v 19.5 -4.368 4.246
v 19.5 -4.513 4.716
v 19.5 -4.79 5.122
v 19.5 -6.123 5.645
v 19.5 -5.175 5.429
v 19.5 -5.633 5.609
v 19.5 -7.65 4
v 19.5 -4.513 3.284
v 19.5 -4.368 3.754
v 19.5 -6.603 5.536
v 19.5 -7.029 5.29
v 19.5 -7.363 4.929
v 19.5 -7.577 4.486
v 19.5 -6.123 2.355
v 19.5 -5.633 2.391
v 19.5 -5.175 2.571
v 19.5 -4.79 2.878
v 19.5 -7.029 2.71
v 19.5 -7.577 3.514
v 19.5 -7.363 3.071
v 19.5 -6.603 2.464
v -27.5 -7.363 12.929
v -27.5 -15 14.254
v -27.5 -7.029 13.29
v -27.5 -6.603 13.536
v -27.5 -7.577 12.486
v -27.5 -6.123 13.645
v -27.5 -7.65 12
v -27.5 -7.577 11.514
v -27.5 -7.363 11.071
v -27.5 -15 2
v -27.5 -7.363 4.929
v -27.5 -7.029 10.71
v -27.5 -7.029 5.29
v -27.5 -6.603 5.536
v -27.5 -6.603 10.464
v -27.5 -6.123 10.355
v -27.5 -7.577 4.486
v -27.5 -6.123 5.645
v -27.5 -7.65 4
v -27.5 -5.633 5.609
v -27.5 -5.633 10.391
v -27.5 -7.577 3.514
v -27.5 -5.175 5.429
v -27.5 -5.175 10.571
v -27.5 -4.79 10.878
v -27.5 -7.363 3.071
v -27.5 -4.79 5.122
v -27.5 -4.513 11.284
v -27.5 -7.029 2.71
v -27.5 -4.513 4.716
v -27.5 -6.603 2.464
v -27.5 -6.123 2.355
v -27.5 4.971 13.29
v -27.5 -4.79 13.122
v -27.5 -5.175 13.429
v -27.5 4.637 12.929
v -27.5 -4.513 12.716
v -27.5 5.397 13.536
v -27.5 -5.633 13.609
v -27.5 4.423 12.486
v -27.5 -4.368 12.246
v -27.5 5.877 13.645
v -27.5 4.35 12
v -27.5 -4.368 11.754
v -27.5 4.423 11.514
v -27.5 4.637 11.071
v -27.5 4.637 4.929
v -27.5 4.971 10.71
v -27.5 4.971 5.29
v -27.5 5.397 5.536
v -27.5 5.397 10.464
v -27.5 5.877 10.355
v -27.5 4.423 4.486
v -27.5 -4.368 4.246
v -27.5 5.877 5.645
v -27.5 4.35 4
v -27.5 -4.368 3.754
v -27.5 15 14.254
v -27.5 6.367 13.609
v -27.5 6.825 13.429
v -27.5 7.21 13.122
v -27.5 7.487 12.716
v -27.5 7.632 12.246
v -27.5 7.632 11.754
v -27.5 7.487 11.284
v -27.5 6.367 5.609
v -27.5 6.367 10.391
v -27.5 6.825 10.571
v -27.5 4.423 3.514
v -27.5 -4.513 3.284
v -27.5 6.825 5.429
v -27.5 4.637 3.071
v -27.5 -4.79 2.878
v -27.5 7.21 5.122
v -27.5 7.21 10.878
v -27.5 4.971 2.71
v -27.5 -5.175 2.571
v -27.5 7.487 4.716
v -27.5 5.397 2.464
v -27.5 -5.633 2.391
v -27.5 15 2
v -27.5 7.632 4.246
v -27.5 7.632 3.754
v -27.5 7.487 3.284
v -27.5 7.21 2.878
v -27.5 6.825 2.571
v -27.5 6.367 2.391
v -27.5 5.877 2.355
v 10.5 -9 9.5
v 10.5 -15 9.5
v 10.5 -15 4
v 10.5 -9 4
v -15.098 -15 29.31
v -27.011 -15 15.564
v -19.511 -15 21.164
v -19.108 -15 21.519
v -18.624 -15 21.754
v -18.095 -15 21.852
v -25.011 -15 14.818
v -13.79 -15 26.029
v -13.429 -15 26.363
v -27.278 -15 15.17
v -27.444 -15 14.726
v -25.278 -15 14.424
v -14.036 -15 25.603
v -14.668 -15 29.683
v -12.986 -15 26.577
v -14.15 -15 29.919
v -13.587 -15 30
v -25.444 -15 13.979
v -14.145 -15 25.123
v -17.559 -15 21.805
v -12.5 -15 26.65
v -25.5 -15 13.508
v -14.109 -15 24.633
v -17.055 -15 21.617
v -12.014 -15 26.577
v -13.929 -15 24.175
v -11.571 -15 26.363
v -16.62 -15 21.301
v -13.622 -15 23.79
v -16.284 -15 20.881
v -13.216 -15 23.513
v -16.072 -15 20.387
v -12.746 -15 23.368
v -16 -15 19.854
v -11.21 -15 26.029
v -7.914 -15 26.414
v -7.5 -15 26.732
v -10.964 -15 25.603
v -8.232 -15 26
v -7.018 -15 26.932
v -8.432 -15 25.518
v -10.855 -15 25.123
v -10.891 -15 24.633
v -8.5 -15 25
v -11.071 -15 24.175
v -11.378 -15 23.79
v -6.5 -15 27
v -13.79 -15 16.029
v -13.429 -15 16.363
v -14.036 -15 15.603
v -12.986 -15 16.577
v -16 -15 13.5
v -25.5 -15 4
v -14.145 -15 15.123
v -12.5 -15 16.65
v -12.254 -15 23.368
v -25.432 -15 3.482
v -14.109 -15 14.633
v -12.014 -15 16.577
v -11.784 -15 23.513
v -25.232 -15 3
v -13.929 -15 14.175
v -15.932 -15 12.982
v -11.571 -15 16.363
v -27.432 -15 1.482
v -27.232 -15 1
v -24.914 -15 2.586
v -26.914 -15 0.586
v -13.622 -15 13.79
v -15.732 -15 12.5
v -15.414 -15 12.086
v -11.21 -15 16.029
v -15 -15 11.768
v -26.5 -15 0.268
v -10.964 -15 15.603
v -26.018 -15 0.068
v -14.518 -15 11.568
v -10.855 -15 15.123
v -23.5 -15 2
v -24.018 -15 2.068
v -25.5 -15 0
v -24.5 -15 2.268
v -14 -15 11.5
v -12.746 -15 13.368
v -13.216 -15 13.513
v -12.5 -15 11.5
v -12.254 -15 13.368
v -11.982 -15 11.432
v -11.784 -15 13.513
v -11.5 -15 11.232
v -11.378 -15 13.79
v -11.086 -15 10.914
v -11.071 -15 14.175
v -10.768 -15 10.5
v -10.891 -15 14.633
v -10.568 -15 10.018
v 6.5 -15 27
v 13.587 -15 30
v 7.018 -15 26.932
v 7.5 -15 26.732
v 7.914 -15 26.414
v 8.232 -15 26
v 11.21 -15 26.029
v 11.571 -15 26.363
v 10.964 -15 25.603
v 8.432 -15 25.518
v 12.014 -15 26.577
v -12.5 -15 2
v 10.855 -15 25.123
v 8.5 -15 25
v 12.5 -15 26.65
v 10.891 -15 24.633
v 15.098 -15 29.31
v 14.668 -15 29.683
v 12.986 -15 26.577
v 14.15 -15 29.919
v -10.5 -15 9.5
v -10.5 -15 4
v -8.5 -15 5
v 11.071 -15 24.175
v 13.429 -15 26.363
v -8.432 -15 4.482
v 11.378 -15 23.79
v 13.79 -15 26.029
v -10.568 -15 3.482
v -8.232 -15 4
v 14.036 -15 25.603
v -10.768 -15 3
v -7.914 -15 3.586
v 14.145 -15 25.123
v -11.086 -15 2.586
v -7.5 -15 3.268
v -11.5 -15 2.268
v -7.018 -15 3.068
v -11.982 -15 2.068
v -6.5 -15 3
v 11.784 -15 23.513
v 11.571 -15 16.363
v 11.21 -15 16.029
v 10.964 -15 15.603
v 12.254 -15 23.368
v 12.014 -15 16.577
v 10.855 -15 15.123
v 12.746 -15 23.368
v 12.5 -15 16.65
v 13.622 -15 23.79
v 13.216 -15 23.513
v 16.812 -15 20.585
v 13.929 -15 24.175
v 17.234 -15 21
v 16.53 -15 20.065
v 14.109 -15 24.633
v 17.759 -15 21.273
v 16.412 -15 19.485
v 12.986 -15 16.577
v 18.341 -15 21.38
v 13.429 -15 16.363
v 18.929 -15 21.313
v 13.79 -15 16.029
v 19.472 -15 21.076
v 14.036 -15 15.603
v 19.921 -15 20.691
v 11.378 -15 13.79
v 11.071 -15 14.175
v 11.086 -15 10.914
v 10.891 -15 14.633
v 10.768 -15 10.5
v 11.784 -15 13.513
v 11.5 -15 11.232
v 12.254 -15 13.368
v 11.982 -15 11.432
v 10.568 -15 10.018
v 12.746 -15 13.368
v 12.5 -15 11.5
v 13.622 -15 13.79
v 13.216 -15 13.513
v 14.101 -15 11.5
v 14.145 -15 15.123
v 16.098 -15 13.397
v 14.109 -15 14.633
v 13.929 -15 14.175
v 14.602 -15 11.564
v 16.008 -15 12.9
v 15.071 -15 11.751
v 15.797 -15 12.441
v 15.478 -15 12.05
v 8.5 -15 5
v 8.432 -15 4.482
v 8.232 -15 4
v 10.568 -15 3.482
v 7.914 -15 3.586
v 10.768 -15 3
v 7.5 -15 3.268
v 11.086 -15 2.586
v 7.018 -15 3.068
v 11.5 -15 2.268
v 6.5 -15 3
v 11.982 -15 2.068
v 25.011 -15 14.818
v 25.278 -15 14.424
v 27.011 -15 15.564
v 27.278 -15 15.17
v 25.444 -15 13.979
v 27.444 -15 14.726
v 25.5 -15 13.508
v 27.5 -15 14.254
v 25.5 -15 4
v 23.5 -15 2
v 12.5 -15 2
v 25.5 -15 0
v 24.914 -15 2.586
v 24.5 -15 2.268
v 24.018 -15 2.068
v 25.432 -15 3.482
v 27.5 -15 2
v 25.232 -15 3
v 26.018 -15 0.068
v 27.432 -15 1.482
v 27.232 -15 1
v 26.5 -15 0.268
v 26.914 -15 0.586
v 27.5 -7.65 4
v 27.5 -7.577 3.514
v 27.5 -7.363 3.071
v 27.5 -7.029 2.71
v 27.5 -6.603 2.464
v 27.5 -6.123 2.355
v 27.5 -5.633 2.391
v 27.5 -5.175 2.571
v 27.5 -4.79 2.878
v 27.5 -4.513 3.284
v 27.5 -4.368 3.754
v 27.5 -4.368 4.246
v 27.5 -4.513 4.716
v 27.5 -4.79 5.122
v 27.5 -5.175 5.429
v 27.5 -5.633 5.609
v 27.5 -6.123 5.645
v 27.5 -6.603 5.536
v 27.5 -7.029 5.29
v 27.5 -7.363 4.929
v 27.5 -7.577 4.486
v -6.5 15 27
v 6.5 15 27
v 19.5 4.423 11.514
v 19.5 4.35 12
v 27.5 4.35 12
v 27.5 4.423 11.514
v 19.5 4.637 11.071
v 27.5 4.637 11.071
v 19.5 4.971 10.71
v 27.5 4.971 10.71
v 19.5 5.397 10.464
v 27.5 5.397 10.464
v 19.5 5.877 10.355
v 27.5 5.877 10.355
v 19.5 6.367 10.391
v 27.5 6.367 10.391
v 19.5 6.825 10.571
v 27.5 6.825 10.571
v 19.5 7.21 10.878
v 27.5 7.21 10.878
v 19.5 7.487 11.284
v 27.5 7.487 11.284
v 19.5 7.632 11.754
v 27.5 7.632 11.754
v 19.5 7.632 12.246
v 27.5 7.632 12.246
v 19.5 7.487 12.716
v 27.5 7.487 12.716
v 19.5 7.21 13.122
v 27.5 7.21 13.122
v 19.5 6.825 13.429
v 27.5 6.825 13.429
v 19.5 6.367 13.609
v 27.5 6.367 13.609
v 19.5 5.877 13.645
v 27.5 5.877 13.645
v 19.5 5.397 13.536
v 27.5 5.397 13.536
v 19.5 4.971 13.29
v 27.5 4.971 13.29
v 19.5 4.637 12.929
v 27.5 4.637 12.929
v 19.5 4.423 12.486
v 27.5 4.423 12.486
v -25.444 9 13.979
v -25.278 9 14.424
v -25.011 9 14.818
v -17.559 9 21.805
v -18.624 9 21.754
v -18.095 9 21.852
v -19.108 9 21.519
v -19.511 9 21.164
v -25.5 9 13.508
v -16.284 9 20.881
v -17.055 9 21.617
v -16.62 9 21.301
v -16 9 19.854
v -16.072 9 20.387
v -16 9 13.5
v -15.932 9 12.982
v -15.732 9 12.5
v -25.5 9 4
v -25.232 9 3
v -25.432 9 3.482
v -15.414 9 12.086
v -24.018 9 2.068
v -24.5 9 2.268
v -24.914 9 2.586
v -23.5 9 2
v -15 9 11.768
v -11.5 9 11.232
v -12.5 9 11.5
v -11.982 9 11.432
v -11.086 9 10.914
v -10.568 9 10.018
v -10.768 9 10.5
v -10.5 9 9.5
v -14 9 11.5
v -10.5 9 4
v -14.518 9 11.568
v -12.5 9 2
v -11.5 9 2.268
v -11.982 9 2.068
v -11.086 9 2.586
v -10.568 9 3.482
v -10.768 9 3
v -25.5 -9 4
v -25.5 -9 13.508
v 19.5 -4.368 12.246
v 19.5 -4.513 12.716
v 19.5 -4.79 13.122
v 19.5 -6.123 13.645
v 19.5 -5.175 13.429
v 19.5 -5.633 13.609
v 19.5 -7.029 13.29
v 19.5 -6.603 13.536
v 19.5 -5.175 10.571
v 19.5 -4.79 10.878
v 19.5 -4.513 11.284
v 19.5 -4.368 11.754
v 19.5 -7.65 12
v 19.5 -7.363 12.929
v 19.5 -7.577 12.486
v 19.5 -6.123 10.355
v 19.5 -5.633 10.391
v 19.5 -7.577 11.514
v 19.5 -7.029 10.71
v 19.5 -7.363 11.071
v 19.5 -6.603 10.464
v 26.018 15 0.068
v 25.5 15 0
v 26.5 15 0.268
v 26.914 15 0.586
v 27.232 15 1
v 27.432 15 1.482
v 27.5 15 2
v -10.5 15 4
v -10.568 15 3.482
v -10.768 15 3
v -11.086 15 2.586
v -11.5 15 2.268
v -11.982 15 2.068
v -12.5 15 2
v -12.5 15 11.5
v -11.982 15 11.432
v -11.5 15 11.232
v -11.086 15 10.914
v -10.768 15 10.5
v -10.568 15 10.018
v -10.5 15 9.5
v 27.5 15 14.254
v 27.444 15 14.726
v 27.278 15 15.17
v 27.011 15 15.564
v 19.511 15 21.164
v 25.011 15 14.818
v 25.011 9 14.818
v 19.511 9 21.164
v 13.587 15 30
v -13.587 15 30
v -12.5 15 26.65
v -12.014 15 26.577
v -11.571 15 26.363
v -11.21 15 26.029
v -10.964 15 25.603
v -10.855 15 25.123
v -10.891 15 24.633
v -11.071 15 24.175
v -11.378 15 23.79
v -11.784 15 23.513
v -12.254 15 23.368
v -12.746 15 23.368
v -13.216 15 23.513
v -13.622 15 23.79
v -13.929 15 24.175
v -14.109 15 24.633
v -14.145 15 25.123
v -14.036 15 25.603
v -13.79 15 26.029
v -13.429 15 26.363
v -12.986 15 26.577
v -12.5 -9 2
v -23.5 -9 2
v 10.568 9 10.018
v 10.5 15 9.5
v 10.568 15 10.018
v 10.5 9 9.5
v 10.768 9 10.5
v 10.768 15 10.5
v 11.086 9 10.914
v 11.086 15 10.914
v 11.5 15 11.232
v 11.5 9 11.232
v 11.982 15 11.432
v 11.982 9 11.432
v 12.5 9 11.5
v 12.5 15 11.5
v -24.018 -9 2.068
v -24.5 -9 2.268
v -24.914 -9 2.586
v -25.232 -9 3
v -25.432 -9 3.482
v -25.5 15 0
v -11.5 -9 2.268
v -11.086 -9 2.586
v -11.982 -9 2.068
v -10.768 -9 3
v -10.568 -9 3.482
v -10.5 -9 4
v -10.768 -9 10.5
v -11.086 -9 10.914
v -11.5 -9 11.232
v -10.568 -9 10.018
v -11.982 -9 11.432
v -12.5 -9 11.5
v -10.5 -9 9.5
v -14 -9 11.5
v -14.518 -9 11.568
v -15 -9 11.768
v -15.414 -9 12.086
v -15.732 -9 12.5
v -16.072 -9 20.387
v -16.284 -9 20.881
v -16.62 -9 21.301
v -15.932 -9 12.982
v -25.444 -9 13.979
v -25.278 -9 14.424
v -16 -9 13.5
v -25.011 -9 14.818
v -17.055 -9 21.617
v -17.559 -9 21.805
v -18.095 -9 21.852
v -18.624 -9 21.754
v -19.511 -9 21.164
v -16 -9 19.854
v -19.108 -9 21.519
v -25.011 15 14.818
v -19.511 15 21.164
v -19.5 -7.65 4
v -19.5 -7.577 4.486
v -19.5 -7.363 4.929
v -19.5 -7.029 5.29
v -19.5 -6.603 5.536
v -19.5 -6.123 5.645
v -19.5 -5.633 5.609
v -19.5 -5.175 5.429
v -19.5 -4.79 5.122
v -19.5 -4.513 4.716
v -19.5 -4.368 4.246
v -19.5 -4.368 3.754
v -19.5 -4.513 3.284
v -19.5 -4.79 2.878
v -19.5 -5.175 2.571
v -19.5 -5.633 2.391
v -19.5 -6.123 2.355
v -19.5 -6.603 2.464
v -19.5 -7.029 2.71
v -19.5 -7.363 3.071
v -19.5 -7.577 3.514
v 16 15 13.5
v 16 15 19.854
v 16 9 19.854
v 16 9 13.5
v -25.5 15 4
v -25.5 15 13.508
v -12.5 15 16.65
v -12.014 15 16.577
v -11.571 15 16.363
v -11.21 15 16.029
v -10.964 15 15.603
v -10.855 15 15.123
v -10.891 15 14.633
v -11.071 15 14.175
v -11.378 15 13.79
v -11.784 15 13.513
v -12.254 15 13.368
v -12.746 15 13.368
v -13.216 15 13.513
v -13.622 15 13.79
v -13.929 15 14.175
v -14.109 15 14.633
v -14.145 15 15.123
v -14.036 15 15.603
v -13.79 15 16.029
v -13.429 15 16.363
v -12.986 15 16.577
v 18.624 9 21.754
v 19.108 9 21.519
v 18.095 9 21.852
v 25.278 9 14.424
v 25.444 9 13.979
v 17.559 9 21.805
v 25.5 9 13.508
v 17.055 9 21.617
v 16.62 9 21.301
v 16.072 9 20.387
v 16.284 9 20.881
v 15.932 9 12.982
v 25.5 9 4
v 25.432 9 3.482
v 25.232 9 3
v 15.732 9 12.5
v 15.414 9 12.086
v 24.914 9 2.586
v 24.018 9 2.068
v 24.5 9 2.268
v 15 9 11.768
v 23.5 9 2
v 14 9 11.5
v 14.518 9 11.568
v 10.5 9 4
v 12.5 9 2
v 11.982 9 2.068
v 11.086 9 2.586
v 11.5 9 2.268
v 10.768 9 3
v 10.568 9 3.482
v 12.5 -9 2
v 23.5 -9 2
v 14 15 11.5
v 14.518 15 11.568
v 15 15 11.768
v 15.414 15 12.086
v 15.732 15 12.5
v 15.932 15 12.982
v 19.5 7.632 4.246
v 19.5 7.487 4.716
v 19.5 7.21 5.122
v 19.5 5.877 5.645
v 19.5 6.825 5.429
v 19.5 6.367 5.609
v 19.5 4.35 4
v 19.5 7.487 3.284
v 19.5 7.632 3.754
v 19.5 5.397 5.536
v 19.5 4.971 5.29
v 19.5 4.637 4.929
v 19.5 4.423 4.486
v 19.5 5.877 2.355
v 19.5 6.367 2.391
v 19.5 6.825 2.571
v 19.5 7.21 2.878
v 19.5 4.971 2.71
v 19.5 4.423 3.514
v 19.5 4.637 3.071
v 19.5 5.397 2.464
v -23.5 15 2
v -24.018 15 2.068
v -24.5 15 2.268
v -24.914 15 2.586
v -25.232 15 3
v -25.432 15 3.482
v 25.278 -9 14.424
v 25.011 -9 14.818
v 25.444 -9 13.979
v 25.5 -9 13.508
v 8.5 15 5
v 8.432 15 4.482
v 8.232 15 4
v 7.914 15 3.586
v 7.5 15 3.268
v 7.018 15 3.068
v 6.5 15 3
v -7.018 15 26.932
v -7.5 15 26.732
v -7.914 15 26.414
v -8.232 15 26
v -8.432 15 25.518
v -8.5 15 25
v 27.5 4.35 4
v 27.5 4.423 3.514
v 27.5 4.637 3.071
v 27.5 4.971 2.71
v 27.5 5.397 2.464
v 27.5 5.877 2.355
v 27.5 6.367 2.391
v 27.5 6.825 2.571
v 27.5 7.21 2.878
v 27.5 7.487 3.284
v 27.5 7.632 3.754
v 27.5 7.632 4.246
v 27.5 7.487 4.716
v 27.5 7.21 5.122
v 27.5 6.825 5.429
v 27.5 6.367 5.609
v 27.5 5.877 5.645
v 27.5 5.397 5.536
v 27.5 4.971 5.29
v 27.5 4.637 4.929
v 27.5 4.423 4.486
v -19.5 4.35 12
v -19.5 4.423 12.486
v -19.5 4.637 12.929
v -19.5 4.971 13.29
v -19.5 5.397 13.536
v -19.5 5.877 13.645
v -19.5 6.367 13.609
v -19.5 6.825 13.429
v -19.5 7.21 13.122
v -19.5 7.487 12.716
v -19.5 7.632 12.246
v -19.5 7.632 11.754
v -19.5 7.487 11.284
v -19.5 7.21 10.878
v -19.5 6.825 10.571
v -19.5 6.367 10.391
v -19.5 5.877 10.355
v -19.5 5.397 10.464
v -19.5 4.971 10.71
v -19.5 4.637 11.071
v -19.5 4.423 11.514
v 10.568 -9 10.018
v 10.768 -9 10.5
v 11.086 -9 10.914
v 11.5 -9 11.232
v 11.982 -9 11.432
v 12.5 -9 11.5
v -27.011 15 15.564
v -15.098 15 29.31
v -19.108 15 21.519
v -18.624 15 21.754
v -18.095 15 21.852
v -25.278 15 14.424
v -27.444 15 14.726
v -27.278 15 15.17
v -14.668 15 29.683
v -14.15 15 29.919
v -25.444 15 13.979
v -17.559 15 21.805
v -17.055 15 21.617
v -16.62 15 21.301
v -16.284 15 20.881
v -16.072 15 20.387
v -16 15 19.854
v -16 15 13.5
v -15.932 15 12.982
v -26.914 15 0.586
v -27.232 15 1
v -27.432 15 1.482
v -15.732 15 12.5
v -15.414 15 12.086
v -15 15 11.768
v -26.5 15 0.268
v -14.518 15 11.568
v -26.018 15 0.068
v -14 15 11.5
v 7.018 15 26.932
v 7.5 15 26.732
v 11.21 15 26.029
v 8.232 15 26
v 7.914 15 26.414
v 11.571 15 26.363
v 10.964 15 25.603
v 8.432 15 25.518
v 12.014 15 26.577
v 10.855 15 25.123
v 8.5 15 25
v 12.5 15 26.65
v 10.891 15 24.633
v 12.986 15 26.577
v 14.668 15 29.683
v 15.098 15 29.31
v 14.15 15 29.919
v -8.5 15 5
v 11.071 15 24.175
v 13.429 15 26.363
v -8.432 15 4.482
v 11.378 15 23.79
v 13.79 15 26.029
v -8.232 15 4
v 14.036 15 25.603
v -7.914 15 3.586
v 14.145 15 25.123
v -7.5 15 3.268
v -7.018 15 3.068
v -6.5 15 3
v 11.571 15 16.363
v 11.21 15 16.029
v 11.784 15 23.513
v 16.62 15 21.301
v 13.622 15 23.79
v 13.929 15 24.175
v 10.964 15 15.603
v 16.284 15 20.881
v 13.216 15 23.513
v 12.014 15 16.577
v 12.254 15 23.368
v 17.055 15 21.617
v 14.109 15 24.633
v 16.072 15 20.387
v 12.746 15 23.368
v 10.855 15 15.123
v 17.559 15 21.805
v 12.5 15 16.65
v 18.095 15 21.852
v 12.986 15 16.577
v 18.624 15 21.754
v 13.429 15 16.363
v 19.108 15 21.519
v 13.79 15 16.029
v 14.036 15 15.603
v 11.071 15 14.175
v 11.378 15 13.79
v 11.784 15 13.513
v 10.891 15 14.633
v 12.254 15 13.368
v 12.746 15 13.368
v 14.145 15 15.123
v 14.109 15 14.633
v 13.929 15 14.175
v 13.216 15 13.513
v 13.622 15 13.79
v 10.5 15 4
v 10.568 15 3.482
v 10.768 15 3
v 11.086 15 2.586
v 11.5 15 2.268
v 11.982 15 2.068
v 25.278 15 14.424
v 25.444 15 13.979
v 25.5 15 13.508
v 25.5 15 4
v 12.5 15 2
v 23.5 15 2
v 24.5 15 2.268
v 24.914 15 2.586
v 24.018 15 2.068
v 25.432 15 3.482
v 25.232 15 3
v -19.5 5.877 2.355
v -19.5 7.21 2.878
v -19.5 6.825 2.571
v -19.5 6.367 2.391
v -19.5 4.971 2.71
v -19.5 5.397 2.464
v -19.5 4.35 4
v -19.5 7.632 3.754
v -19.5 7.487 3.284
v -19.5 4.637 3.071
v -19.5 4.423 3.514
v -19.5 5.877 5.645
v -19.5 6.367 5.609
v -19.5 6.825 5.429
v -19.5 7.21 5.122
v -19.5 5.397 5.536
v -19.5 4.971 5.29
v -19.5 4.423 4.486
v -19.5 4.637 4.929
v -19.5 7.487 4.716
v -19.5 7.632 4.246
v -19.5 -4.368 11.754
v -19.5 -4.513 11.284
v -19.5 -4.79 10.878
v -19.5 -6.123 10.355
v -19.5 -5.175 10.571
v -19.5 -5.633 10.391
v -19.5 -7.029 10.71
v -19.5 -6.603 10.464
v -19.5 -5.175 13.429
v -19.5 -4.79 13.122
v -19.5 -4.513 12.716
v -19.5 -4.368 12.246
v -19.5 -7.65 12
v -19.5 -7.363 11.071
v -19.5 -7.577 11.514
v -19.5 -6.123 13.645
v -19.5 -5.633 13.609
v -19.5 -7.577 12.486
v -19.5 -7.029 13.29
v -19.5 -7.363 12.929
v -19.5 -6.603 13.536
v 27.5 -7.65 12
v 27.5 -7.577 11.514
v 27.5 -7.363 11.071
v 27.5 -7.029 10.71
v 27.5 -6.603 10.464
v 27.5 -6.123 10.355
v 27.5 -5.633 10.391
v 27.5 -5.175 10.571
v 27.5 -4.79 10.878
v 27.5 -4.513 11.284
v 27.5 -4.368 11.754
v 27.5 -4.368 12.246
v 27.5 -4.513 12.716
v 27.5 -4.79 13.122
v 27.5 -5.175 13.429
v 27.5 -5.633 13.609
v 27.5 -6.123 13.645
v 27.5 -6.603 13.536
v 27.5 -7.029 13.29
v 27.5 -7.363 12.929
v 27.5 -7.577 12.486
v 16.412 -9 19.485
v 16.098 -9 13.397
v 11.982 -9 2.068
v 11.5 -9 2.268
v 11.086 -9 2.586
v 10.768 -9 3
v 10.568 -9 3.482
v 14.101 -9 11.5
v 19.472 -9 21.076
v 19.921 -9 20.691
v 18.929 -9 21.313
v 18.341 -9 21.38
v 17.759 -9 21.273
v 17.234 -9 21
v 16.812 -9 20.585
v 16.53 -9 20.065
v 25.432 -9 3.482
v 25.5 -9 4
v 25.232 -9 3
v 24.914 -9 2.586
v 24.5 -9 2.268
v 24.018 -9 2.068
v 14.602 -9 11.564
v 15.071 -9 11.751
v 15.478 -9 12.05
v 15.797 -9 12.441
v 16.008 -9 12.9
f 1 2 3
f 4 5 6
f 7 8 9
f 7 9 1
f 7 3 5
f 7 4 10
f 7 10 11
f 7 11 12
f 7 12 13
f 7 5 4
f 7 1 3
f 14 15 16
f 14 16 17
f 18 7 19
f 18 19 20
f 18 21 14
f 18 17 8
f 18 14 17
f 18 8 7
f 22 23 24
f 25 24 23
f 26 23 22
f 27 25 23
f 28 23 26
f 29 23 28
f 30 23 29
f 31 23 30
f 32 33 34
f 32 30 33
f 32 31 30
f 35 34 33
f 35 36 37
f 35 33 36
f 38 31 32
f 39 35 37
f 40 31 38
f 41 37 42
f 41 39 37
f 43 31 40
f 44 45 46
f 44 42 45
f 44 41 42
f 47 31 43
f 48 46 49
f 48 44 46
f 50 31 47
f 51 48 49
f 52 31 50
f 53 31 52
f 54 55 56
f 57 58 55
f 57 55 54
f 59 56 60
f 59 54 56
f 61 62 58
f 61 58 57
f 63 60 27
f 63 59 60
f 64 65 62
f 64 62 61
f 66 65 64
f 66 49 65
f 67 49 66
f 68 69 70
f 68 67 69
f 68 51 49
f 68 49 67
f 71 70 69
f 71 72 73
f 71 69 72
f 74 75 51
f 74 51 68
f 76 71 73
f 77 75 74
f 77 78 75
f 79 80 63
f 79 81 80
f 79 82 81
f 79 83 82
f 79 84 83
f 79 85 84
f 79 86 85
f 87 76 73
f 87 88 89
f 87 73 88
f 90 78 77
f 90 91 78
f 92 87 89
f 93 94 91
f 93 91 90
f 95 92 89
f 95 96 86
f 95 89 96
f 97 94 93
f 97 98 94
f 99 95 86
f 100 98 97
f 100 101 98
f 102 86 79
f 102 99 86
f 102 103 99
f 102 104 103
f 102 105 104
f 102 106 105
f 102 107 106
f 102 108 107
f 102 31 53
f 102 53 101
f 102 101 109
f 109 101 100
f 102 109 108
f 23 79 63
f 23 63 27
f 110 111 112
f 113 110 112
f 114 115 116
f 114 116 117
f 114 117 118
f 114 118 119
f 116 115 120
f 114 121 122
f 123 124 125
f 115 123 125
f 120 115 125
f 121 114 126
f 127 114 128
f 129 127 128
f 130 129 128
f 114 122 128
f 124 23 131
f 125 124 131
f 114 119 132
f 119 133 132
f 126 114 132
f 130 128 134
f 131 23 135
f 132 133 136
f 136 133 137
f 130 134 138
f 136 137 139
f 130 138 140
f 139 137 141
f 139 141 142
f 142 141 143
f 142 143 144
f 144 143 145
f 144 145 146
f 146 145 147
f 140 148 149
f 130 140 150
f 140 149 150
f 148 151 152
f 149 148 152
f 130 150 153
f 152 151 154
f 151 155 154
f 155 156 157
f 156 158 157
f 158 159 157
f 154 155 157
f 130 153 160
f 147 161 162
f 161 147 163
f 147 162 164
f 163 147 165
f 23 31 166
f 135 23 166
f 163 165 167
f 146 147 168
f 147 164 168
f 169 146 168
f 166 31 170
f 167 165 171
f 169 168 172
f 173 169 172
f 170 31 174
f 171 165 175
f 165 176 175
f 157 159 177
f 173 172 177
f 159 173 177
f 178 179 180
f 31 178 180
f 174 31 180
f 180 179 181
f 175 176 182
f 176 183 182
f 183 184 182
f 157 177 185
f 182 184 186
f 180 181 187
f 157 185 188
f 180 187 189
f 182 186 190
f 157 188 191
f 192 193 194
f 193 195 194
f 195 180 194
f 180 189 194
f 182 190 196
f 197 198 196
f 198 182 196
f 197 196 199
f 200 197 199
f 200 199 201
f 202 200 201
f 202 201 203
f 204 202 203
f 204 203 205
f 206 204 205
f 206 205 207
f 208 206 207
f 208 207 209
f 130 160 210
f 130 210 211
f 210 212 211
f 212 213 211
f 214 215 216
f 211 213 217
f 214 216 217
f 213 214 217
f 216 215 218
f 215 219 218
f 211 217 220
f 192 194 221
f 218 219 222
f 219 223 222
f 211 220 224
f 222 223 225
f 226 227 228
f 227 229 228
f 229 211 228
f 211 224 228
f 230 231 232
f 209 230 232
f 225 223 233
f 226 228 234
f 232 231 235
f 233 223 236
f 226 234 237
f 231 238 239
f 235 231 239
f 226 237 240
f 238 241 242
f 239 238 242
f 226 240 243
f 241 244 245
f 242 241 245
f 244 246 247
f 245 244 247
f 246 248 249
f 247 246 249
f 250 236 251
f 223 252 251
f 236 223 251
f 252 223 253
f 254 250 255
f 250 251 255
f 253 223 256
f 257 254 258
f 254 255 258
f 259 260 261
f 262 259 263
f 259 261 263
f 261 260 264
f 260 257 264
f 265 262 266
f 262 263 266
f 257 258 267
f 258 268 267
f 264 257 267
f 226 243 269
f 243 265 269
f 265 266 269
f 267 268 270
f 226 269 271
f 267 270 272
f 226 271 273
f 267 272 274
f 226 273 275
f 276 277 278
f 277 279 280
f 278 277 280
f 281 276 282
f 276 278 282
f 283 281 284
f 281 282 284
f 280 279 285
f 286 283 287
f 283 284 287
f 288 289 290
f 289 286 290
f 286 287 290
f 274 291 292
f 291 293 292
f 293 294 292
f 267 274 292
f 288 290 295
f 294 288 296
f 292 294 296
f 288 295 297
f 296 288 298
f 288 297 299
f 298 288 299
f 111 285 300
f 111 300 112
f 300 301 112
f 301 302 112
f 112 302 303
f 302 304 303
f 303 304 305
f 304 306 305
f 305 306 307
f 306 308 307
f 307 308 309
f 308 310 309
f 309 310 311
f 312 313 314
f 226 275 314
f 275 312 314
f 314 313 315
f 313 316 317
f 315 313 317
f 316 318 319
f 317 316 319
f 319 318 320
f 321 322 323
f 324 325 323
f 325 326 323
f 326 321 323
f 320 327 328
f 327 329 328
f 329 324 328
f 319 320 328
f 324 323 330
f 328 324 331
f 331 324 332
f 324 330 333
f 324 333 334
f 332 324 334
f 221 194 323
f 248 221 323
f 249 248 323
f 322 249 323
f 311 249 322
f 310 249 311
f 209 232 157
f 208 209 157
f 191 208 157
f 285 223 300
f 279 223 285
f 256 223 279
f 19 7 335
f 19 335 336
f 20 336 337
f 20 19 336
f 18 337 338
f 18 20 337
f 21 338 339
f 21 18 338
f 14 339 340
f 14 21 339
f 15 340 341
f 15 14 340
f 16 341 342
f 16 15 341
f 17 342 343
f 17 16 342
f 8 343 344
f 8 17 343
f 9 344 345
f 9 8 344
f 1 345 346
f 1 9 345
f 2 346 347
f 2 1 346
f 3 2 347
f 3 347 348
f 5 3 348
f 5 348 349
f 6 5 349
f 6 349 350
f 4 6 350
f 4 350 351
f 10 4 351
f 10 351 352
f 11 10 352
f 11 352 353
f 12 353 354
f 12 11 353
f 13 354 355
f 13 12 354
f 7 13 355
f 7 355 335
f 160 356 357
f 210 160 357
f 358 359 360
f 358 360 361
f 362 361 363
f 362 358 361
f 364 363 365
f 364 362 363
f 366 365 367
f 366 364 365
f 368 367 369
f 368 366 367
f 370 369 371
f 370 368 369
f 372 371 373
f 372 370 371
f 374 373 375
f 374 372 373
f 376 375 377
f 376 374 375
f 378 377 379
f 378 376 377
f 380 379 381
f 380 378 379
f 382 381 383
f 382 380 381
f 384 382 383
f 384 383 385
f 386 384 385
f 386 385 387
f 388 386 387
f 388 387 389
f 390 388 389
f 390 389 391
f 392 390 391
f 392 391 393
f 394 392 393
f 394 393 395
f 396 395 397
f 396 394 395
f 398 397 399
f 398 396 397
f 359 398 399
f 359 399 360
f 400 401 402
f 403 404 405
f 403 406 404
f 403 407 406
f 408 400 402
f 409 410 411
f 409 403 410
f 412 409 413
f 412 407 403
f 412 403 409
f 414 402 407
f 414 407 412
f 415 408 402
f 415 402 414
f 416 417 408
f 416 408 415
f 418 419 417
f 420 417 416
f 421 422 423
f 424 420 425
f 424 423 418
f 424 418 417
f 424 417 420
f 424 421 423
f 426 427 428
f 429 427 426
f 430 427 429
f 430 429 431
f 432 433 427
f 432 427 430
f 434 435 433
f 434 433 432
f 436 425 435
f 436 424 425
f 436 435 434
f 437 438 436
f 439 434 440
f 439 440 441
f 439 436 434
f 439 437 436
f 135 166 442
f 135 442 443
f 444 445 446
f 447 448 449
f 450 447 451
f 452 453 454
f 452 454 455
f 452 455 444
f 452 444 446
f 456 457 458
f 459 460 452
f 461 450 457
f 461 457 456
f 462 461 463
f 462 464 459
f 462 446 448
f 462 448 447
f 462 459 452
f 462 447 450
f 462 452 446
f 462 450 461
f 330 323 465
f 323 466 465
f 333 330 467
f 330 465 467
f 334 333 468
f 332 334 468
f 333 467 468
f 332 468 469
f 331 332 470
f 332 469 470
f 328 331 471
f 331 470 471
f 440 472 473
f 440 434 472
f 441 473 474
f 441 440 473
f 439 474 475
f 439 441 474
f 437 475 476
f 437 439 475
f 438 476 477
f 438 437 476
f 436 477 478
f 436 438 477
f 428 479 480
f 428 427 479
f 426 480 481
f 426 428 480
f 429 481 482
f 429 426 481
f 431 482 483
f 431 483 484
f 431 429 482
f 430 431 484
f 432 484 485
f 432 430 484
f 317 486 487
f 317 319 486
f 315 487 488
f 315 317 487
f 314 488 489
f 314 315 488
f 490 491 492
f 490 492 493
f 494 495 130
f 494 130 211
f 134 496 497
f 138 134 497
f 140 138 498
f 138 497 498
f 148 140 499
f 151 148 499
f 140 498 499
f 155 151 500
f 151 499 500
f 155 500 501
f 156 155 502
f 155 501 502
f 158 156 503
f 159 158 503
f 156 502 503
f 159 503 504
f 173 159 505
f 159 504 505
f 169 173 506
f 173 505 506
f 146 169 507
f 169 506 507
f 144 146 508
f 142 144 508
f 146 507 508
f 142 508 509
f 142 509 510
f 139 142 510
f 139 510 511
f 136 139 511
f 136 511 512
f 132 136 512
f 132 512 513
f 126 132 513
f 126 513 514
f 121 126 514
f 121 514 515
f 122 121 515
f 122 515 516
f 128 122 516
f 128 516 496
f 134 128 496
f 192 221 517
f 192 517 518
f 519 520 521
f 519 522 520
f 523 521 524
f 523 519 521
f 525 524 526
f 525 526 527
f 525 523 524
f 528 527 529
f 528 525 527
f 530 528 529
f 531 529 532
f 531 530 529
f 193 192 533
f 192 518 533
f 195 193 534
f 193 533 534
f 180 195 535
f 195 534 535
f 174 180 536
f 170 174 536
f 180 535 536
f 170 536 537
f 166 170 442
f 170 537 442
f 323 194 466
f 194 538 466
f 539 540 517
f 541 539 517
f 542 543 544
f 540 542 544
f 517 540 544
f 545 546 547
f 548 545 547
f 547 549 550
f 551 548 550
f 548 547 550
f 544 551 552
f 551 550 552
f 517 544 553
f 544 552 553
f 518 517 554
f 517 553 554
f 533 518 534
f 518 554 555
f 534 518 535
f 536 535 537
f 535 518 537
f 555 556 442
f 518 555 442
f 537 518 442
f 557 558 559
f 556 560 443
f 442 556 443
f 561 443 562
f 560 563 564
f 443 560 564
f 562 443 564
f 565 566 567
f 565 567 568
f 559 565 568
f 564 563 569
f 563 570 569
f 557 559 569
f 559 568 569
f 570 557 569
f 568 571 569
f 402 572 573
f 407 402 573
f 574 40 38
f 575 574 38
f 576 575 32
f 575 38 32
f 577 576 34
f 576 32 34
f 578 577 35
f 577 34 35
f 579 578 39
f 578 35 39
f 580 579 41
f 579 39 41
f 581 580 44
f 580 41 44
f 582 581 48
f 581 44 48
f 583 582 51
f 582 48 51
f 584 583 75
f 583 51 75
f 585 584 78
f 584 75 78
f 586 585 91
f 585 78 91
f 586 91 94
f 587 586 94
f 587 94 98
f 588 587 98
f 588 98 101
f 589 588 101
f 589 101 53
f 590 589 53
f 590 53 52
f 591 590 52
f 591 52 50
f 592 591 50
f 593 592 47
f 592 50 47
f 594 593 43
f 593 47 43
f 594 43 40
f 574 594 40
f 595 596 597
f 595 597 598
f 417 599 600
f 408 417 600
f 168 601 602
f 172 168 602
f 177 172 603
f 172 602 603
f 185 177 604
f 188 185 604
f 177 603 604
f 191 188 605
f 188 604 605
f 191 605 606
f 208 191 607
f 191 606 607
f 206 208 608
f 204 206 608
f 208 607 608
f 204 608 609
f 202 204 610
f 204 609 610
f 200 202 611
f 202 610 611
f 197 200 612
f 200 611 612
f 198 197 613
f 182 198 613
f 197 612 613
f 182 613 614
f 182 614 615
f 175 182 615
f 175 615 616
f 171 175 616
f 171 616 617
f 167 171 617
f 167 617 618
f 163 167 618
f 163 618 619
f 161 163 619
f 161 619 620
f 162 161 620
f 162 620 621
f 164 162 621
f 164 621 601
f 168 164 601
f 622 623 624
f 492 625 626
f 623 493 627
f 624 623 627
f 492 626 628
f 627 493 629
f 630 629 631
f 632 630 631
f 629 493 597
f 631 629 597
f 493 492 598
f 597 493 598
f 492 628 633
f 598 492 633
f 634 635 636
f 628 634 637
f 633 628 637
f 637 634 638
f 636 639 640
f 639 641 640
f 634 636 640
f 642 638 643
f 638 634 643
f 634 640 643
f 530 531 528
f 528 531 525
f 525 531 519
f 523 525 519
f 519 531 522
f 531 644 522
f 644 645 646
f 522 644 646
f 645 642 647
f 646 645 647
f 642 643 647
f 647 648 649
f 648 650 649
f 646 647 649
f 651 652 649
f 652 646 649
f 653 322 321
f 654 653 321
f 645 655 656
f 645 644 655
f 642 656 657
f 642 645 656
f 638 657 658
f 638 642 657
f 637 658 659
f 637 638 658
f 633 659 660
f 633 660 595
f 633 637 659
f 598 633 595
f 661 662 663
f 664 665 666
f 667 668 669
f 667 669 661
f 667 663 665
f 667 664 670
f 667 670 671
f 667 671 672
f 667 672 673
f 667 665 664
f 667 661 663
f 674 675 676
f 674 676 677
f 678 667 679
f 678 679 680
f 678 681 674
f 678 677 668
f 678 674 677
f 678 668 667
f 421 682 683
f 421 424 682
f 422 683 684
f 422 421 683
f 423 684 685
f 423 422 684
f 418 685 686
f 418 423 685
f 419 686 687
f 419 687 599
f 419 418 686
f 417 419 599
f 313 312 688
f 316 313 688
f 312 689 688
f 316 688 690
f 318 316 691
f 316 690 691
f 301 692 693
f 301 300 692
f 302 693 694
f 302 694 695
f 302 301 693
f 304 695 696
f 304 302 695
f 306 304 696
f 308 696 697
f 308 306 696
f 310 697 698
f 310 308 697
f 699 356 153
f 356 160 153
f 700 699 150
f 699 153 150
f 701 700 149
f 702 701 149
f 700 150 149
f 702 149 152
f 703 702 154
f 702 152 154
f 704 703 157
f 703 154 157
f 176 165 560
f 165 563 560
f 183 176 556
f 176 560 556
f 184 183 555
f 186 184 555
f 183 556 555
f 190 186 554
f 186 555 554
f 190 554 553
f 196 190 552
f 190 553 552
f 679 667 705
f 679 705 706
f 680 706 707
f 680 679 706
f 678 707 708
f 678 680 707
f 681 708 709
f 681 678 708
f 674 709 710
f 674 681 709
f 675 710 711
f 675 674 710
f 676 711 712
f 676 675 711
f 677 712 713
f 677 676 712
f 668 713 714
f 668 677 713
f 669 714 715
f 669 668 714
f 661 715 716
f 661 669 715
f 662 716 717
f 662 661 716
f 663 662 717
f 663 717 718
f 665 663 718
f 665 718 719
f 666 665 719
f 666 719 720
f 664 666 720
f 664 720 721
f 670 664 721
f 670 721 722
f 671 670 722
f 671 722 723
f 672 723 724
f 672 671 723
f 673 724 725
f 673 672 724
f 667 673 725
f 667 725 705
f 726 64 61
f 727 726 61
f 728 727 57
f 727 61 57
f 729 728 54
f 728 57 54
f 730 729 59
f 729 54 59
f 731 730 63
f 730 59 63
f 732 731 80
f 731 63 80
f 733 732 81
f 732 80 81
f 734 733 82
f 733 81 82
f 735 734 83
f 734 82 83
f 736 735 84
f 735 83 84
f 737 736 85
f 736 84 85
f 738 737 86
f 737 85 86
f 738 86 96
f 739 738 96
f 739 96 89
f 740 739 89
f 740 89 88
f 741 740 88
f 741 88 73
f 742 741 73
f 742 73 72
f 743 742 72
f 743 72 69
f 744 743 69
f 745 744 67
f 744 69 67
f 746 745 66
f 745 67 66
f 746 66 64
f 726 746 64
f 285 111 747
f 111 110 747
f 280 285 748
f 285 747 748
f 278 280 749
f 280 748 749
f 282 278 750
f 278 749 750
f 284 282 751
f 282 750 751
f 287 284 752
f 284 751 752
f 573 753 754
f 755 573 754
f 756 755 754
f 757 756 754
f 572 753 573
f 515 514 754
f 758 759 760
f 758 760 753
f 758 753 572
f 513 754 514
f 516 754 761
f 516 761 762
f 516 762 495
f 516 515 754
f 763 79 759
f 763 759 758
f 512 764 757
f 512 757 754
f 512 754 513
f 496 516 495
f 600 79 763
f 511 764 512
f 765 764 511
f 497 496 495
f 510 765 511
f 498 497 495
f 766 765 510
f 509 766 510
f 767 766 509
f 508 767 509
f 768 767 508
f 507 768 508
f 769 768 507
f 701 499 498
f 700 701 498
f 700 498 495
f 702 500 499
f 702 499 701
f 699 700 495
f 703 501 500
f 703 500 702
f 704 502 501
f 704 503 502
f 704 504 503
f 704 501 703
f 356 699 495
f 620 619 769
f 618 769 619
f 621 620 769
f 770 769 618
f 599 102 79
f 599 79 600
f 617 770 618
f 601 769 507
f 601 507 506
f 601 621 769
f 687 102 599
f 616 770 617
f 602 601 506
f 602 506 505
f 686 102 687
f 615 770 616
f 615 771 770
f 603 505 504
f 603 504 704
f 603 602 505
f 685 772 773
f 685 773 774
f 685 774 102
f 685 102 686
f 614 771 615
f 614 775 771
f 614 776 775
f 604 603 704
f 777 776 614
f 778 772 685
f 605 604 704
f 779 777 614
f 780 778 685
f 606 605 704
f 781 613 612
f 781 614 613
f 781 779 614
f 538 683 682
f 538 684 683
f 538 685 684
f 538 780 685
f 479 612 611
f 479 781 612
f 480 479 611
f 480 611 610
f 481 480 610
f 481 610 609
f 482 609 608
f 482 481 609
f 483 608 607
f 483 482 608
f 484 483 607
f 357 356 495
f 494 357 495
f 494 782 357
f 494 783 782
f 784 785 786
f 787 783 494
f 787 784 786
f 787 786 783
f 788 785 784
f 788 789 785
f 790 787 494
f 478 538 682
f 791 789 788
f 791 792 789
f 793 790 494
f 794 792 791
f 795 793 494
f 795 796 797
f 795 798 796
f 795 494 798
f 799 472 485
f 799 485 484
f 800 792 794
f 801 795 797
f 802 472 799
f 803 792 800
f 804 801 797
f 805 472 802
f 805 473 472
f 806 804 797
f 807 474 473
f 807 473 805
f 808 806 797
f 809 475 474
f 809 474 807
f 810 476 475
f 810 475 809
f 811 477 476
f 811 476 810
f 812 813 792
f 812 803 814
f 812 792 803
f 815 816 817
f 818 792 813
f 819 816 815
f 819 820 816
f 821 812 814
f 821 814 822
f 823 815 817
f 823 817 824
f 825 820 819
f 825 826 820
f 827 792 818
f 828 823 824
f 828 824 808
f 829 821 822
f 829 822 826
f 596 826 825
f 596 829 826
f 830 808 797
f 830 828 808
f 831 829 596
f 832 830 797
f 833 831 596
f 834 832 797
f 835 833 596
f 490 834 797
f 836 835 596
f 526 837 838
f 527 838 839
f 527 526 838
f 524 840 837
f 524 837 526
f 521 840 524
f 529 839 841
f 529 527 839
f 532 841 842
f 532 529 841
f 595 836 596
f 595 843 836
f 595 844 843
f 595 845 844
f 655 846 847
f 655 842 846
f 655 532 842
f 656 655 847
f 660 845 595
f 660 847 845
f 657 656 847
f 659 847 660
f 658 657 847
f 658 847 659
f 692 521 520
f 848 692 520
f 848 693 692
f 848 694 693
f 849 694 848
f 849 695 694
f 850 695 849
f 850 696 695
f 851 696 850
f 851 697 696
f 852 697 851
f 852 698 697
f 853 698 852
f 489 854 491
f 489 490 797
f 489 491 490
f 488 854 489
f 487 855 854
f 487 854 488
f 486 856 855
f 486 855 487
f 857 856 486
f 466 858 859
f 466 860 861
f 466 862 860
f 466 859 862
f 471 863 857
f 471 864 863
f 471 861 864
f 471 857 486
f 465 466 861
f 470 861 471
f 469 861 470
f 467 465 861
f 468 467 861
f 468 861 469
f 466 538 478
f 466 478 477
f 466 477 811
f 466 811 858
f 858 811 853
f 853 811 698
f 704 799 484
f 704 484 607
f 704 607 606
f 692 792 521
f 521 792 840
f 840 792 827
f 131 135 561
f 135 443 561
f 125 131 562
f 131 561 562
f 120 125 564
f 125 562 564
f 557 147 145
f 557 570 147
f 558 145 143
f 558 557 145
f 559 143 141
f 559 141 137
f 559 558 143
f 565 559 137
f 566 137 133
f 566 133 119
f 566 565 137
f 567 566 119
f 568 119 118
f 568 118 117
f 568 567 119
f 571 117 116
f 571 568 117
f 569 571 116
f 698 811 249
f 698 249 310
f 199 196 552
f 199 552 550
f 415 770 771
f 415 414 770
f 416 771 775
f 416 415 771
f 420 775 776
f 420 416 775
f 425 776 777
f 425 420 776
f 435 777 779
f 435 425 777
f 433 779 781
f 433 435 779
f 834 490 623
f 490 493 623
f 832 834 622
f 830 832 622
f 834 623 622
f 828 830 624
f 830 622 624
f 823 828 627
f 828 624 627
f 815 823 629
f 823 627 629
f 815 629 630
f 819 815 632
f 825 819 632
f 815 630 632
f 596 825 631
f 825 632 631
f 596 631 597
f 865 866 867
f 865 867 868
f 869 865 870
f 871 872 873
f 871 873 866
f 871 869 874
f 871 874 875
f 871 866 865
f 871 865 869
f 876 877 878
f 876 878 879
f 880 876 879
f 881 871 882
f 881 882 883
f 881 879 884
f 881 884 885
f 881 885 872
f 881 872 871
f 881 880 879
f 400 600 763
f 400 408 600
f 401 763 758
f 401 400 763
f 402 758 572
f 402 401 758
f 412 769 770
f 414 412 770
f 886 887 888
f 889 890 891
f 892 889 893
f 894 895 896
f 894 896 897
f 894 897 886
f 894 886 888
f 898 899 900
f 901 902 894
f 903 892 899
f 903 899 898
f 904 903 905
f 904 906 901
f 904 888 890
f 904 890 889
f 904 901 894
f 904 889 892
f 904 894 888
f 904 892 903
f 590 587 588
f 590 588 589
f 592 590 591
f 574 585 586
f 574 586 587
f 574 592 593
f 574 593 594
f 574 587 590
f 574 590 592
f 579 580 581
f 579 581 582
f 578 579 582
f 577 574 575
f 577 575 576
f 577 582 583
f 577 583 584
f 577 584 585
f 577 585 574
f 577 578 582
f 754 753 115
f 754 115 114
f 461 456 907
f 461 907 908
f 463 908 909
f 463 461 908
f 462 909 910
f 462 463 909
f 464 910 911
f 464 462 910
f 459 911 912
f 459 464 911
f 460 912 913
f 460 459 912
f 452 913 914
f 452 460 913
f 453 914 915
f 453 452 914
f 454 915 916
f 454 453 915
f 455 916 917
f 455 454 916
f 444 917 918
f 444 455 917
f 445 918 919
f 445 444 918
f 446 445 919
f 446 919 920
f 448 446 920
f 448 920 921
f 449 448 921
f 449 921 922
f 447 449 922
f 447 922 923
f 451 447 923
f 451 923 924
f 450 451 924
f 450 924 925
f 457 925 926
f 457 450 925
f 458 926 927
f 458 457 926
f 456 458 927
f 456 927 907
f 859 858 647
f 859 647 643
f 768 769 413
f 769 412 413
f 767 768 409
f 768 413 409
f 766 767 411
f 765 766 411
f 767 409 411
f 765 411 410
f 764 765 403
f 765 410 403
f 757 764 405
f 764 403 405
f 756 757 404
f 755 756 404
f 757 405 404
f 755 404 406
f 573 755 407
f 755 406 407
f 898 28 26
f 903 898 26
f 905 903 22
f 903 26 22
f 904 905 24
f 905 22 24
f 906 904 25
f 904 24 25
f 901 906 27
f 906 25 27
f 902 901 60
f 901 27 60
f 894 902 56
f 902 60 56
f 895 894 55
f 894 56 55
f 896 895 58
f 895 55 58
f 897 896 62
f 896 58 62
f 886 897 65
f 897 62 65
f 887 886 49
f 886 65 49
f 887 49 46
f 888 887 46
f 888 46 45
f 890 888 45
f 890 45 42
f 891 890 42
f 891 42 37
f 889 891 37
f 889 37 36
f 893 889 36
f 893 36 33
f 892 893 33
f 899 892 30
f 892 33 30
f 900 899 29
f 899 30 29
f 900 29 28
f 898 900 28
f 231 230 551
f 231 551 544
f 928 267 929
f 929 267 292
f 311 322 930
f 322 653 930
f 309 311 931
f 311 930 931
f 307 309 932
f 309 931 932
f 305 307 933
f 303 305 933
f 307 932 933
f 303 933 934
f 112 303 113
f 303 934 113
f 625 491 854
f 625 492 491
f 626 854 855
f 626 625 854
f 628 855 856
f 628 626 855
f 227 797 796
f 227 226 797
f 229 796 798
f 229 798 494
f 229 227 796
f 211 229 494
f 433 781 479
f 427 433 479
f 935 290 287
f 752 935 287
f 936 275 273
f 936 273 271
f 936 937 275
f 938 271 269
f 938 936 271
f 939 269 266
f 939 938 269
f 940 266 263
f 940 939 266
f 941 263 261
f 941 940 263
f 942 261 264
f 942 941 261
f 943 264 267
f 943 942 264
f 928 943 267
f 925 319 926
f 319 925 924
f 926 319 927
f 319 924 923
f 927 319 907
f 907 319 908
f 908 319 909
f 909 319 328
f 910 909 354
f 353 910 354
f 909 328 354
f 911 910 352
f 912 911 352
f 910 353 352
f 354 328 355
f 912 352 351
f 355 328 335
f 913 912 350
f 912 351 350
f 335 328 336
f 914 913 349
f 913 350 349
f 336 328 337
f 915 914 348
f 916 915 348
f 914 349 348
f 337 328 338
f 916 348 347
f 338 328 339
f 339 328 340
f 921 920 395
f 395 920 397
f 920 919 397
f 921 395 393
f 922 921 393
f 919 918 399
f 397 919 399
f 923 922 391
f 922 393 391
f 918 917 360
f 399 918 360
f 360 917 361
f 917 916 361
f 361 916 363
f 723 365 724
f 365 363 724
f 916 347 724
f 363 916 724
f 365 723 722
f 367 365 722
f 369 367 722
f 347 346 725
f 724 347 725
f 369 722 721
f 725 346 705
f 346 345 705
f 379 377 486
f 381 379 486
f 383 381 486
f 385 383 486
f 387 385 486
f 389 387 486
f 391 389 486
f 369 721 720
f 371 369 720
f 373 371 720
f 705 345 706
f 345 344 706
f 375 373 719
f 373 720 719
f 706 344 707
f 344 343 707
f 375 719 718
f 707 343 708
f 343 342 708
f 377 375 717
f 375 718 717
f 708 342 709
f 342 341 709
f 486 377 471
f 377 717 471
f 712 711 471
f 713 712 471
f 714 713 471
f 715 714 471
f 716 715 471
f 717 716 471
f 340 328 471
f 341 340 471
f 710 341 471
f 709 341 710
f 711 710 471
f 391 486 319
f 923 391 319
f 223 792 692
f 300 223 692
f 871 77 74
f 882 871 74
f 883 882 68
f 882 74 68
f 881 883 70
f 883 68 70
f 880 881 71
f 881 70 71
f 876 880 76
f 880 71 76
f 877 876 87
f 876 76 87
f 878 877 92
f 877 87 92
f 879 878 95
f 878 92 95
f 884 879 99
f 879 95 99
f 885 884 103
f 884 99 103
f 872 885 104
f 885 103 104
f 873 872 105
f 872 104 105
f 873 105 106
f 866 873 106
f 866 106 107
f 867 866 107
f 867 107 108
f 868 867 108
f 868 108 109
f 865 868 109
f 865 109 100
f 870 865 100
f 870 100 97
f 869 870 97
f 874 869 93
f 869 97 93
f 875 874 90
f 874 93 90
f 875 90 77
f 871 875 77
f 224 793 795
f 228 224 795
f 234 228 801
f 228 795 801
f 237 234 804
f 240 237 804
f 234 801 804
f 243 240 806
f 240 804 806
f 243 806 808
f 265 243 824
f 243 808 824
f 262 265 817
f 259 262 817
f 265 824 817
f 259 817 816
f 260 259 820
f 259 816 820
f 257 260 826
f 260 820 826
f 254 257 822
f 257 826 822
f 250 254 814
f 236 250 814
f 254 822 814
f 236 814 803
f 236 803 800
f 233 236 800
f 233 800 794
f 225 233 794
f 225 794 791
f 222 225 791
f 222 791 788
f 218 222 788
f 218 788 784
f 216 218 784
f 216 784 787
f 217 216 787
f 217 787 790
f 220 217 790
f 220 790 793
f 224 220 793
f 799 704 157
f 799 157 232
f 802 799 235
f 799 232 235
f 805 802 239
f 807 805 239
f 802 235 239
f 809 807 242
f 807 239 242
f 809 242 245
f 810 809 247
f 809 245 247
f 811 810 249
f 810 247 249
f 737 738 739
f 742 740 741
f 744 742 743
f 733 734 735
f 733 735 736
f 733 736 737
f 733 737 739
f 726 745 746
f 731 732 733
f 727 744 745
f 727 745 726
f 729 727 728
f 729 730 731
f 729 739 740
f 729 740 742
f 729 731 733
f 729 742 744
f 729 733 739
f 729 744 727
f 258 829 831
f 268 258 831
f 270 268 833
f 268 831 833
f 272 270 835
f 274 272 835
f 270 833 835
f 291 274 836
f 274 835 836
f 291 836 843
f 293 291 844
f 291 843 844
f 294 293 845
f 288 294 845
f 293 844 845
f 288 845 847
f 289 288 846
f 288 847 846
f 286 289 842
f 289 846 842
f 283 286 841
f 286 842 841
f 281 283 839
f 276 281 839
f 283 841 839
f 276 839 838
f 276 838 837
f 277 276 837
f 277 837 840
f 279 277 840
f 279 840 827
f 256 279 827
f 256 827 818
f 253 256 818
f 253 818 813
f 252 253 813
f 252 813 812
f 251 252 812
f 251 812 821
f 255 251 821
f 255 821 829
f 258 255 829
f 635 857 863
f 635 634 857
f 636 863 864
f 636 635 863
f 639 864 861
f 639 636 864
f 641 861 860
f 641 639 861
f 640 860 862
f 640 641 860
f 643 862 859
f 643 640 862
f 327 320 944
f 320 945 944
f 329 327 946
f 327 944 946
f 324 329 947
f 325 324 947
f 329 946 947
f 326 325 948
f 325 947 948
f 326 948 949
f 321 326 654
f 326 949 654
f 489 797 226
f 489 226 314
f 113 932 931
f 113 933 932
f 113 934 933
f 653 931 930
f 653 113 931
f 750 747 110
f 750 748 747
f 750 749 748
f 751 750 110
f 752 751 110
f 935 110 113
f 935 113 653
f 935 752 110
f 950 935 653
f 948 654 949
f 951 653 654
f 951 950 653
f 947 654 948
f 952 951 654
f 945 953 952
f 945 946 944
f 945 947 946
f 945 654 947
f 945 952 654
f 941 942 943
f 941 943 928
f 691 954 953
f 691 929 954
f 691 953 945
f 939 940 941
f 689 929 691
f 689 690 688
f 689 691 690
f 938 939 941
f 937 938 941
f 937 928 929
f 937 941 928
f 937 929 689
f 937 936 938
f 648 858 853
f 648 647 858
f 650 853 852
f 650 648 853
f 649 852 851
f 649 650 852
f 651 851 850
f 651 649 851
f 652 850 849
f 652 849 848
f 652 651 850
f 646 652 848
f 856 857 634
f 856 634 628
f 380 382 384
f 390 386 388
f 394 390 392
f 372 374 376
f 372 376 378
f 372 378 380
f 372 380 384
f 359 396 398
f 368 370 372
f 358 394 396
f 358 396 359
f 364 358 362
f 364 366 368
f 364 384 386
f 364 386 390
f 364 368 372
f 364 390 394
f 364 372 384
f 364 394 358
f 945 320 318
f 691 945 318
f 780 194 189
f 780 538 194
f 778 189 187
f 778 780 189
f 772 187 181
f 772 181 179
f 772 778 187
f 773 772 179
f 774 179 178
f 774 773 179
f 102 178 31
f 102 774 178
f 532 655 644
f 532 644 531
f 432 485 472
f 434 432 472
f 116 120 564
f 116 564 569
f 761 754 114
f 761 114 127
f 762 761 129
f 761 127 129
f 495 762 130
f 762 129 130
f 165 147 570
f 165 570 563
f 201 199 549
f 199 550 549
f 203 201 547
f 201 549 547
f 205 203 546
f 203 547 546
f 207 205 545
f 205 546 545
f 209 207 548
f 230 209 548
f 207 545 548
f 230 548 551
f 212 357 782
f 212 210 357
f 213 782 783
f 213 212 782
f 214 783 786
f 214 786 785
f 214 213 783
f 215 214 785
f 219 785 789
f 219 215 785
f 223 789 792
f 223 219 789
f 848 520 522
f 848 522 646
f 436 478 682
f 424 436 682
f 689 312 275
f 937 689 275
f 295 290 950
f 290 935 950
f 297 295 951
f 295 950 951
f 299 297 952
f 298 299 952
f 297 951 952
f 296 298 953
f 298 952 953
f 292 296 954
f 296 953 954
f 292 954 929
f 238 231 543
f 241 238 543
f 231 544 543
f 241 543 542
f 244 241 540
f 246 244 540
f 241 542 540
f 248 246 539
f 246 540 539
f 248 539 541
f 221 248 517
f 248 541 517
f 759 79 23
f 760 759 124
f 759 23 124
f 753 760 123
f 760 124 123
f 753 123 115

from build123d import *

# Parameters (mm, degrees)
SKETCH_1_W          = 55
SKETCH_1_H          = 30
EXTRUDE_1_DEPTH     = 30
SKETCH_2_R          = 1.65
SKETCH_2_W          = 17
SKETCH_2_H          = 24
CUT_EXTRUDE_1_DEPTH = 40
CUT_EXTRUDE_3_DEPTH = 40
CUT_EXTRUDE_4_DEPTH = 6
CUT_EXTRUDE_5_DEPTH = 6
FILLET_1_R          = 2
FILLET_2_R          = 2
FILLET_3_R          = 2
SKETCH_10_R         = 1.65
CUT_EXTRUDE_7_DEPTH = 8
CUT_EXTRUDE_START   = -8
SKETCH_11_R         = 1.65
CUT_EXTRUDE_8_DEPTH = 8


with BuildPart() as part:
    # 草图1 → 凸台-拉伸1 (new body)
    with BuildSketch(Plane.XY):
        Rectangle(SKETCH_1_W, SKETCH_1_H)
    extrude(amount=EXTRUDE_1_DEPTH)

    # 草图2 → 切除-拉伸1 (cut)
    with BuildSketch(Plane(origin=(0, 15, 0), x_dir=(1, 0, 0), z_dir=(0, 1, 0))):
        with Locations(Location((12.5, -25, 0), (0, 0, 270))):
            Circle(SKETCH_2_R)
        with Locations(Location((-12.5, -25, 0), (0, 0, 270))):
            Circle(SKETCH_2_R)
        with Locations(Location((-12.5, -15, 0), (0, 0, 270))):
            Circle(SKETCH_2_R)
        with Locations(Location((12.5, -15, 0), (0, 0, 270))):
            Circle(SKETCH_2_R)
        with Locations((0, -15)):
            Rectangle(SKETCH_2_W, SKETCH_2_H)
    extrude(amount=-CUT_EXTRUDE_1_DEPTH, mode=Mode.SUBTRACT)

    # 草图7 → 切除-拉伸3 (cut)
    with BuildSketch(Plane(origin=(0, 15, 0), x_dir=(1, 0, 0), z_dir=(0, 1, 0))):
        Polygon((27.5, -15), (27.5, -30), (14.5, -30), align=None)
        Polygon((-14.5, -30), (-27.5, -30), (-27.5, -15), align=None)
    extrude(amount=-CUT_EXTRUDE_3_DEPTH, mode=Mode.SUBTRACT)

    # 草图8 → 切除-拉伸4 (cut)
    with BuildSketch(Plane(origin=(0, 15, 0), x_dir=(1, 0, 0), z_dir=(0, 1, 0))):
        Polygon((-16, -25.215471809), (-16, -11.5), (-10.5, -11.5), (-10.5, -2), (-25.5, -2), (-25.5, -14.253933347), align=None)
        Polygon((16, -25.215471809), (16, -11.5), (10.5, -11.5), (10.5, -2), (25.5, -2), (25.5, -14.253933347), align=None)
    extrude(amount=-CUT_EXTRUDE_4_DEPTH, mode=Mode.SUBTRACT)

    # 草图9 → 切除-拉伸5 (cut)
    with BuildSketch(Plane.XZ.offset(15)):
        Polygon((-16, 25.215471809), (-16, 11.5), (-10.5, 11.5), (-10.5, 2), (-25.5, 2), (-25.5, 14.253933347), align=None)
        Polygon((16.668372364, 24.444272927), (16, 11.5), (10.5, 11.5), (10.5, 2), (25.5, 2), (25.5, 14.253933347), align=None)
    extrude(amount=-CUT_EXTRUDE_5_DEPTH, mode=Mode.SUBTRACT)

    # 圆角1
    fillet_1_edges = [part.edges().sort_by_distance(p)[0] for p in [
        (-25.5, -12, 14.253933347),
        (-16, -12, 25.215471809),
        (-16, -12, 11.5),
        (-10.5, -12, 11.5),
        (-10.5, -12, 2),
        (-25.5, -12, 2),
        (25.5, -12, 2),
        (10.5, -12, 2),
        (10.5, -12, 11.5),
        (16, -12, 11.5),
        (16.668372364, -12, 24.444272927),
        (25.5, -12, 14.253933347),
        (8.5, 0, 3),
        (8.5, 0, 27),
        (-8.5, 0, 27),
        (-8.5, 0, 3),
    ]]
    fillet(fillet_1_edges, radius=FILLET_1_R)

    # 圆角2
    fillet_2_edges = [part.edges().sort_by_distance(p)[0] for p in [
        (25.5, 12, 14.253933347),
        (16, 12, 25.215471809),
        (16, 12, 11.5),
        (10.5, 12, 11.5),
        (10.5, 12, 2),
        (25.5, 12, 2),
        (-16, 12, 25.215471809),
        (-25.5, 12, 14.253933347),
        (-25.5, 12, 2),
        (-10.5, 12, 2),
        (-10.5, 12, 11.5),
        (-16, 12, 11.5),
    ]]
    fillet(fillet_2_edges, radius=FILLET_2_R)

    # 圆角3
    fillet_3_edges = [part.edges().sort_by_distance(p)[0] for p in [
        (-27.5, 0, 0),
        (-14.5, 0, 30),
        (14.5, 0, 30),
        (27.5, 0, 0),
        (27.5, 0, 15),
        (-27.5, 0, 15),
    ]]
    fillet(fillet_3_edges, radius=FILLET_3_R)

    # 草图10 → 切除-拉伸7 (cut)
    with BuildSketch(Plane.ZY.offset(27.5)):
        with Locations(Location((12, -6, 0), (0, 0, 270))):
            Circle(SKETCH_10_R)
        with Locations(Location((4, -6, 0), (0, 0, 270))):
            Circle(SKETCH_10_R)
        with Locations(Location((4, 6, 0), (0, 0, 270))):
            Circle(SKETCH_10_R)
        with Locations(Location((12, 6, 0), (0, 0, 270))):
            Circle(SKETCH_10_R)
    extrude(amount=-CUT_EXTRUDE_7_DEPTH, mode=Mode.SUBTRACT)

    # 草图11 → 切除-拉伸8 (cut)
    with BuildSketch(Plane(origin=(27.5, 0, 0), x_dir=(0, 0, -1), z_dir=(1, 0, 0)).offset(CUT_EXTRUDE_START)):
        with Locations(Location((-12, 6, 0), (0, 0, 270))):
            Circle(SKETCH_11_R)
        with Locations(Location((-4, 6, 0), (0, 0, 270))):
            Circle(SKETCH_11_R)
        with Locations(Location((-4, -6, 0), (0, 0, 270))):
            Circle(SKETCH_11_R)
        with Locations(Location((-12, -6, 0), (0, 0, 270))):
            Circle(SKETCH_11_R)
    extrude(amount=CUT_EXTRUDE_8_DEPTH, mode=Mode.SUBTRACT)


solid = part.part
